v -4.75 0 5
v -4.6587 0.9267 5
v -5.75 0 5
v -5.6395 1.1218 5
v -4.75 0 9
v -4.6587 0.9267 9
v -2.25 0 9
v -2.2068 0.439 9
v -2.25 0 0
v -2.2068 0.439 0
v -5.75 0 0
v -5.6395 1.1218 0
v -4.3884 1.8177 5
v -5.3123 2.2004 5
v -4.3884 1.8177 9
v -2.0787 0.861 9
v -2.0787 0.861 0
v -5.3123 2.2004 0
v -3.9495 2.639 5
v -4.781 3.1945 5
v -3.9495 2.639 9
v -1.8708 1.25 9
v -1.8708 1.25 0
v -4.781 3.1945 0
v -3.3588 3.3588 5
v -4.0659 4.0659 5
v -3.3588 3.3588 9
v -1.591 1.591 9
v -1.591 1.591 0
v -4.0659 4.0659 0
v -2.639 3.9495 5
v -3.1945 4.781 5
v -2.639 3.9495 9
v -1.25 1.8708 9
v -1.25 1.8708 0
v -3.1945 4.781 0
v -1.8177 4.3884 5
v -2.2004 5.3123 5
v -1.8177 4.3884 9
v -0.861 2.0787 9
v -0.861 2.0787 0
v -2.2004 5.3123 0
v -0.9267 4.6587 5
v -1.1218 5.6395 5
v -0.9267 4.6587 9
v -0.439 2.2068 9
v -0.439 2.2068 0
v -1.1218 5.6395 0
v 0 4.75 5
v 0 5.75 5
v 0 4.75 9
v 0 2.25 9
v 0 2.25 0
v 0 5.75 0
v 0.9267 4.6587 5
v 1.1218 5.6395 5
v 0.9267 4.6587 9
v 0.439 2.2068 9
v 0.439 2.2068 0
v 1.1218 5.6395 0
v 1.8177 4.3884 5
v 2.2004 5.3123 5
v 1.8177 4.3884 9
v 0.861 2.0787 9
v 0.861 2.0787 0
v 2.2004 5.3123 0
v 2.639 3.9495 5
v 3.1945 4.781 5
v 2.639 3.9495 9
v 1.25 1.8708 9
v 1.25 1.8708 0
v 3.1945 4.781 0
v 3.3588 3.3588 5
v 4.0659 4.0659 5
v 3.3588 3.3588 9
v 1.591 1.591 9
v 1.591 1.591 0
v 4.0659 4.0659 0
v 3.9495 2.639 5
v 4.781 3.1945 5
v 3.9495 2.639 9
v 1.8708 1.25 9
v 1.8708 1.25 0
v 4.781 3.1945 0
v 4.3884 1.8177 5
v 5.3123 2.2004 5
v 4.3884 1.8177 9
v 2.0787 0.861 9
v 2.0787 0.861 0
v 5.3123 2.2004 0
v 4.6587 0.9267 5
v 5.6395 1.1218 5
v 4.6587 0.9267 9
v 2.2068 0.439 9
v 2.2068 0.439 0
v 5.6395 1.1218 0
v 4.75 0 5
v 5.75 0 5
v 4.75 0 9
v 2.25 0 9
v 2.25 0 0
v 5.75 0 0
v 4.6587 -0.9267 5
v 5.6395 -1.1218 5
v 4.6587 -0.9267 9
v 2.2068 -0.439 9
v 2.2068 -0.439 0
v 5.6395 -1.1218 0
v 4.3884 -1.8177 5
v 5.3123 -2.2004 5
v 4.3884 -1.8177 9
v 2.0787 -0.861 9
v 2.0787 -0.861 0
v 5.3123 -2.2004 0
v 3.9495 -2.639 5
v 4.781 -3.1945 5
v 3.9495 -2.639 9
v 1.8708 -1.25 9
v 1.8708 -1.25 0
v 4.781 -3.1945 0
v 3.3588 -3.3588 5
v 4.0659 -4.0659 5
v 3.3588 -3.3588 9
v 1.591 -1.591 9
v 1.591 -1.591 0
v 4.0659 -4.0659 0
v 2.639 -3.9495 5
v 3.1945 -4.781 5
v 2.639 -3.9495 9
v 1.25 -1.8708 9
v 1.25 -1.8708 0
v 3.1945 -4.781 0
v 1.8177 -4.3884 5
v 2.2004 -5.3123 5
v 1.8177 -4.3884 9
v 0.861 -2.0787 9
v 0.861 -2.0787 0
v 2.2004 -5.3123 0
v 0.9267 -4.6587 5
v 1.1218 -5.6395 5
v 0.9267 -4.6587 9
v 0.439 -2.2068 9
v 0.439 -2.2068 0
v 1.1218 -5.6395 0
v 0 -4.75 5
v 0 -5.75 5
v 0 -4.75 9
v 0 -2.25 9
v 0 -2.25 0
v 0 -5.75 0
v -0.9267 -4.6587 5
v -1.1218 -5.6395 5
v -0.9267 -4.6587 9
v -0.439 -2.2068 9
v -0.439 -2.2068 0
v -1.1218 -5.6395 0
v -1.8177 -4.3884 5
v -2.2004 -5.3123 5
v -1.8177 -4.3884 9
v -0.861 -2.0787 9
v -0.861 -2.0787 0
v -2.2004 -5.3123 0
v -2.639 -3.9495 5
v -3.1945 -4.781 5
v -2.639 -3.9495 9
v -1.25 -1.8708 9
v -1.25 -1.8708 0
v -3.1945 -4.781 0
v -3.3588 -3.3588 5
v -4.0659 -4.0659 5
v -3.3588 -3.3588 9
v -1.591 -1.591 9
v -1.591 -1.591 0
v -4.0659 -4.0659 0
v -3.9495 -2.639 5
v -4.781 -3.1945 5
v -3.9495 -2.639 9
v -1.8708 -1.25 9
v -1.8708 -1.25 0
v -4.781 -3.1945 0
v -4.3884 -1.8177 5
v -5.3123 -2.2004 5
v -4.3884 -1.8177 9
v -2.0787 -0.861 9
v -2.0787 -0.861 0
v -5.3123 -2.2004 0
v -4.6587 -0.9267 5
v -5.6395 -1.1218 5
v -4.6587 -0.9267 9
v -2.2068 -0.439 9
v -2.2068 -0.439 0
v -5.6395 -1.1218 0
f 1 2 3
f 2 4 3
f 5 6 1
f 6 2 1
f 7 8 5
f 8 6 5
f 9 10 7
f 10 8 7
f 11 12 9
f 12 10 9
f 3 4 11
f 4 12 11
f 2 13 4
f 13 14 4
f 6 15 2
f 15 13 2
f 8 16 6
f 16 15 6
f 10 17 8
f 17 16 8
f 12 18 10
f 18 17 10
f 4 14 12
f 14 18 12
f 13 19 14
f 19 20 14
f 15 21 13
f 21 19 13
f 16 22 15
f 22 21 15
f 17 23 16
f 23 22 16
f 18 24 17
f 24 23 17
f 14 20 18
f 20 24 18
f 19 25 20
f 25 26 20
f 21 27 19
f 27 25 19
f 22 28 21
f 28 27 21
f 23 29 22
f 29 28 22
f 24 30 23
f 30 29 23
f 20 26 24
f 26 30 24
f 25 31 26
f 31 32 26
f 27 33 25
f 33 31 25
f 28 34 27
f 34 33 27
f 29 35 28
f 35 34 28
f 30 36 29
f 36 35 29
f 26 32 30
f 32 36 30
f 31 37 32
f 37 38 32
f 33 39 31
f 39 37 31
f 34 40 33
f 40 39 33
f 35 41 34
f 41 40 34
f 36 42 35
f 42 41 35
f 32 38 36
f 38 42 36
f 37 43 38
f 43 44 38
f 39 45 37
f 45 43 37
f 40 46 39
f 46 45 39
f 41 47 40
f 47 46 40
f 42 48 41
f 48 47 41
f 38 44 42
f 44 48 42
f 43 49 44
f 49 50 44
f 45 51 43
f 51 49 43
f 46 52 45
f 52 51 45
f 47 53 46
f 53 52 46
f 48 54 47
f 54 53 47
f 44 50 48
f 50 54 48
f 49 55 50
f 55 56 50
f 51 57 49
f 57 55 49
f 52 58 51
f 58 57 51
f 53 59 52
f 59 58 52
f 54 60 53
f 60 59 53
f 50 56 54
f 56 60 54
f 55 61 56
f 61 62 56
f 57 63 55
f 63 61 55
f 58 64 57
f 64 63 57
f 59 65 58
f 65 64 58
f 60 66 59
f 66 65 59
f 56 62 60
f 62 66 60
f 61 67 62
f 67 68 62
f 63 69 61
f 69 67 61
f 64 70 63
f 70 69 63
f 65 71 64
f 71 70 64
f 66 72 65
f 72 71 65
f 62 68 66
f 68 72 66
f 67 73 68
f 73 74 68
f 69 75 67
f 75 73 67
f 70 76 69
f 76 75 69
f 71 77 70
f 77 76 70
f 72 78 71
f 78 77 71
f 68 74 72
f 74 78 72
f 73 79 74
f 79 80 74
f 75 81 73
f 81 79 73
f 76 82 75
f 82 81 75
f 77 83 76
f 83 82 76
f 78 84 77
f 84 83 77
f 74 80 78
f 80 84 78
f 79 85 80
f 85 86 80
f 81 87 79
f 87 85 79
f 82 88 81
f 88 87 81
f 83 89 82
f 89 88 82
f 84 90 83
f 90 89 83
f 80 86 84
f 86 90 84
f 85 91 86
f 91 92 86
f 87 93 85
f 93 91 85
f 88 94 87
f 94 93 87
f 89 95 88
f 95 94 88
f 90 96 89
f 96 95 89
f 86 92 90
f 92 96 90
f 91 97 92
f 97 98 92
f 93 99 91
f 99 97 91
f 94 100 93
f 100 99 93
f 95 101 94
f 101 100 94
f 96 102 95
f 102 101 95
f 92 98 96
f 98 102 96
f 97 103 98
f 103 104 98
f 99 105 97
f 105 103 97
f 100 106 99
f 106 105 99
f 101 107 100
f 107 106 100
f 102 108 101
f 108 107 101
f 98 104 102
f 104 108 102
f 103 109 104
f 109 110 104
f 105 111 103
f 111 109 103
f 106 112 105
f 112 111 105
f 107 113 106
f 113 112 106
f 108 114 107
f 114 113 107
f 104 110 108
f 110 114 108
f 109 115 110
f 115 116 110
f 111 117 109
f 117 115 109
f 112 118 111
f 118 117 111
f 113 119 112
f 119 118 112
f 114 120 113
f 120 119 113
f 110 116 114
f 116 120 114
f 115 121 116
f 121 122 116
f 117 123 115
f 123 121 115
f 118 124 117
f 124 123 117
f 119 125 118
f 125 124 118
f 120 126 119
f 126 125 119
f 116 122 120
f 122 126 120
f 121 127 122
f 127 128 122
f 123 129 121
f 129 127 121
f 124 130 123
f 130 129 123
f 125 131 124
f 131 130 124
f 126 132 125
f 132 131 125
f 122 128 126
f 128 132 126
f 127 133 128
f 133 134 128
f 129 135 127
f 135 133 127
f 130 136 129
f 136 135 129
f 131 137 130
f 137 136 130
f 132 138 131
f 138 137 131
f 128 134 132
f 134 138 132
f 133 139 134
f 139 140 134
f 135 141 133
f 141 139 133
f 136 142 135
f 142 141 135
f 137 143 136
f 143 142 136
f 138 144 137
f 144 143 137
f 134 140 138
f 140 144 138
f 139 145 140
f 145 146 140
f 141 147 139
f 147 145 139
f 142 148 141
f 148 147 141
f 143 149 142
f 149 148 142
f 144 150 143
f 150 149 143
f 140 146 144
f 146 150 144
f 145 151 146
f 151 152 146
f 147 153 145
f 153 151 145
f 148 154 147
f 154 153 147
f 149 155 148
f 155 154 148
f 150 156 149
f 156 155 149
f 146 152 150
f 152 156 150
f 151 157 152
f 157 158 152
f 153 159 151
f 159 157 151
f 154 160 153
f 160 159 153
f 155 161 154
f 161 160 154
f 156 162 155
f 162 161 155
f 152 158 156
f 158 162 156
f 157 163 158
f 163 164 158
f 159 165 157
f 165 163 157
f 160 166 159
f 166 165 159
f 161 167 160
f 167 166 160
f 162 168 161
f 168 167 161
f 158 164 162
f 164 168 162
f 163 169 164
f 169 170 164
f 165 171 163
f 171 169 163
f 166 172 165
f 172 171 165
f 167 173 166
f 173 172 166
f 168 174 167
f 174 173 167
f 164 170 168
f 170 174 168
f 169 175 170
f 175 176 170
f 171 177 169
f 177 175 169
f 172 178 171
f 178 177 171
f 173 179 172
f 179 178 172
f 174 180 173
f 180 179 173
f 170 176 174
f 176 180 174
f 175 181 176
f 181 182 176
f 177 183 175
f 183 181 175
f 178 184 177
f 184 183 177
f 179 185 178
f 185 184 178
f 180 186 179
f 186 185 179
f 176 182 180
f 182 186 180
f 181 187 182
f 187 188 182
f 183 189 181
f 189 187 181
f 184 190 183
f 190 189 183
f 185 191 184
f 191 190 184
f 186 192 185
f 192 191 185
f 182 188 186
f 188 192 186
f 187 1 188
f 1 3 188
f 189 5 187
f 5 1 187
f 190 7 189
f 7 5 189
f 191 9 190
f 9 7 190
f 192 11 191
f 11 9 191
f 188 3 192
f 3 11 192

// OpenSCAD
$fn = 32;

// ----------------------------------------------------------------------
// Form washer: stepped_c washer, 11.5 mm outside, 4.5 mm bore
// ----------------------------------------------------------------------

// --- parameters (mm) ---
revolve_angle = 360;      // full turn around the Z axis
profile_points = 6;       // points of the closed outline

profile = [[2.25, 0], [5.75, 0], [5.75, 5], [4.75, 5], [4.75, 9], [2.25, 9]];  // single closed polygon, 6 points, counter clockwise

// --- the one profile operation ---
rotate_extrude(angle = revolve_angle) polygon(points = profile);
